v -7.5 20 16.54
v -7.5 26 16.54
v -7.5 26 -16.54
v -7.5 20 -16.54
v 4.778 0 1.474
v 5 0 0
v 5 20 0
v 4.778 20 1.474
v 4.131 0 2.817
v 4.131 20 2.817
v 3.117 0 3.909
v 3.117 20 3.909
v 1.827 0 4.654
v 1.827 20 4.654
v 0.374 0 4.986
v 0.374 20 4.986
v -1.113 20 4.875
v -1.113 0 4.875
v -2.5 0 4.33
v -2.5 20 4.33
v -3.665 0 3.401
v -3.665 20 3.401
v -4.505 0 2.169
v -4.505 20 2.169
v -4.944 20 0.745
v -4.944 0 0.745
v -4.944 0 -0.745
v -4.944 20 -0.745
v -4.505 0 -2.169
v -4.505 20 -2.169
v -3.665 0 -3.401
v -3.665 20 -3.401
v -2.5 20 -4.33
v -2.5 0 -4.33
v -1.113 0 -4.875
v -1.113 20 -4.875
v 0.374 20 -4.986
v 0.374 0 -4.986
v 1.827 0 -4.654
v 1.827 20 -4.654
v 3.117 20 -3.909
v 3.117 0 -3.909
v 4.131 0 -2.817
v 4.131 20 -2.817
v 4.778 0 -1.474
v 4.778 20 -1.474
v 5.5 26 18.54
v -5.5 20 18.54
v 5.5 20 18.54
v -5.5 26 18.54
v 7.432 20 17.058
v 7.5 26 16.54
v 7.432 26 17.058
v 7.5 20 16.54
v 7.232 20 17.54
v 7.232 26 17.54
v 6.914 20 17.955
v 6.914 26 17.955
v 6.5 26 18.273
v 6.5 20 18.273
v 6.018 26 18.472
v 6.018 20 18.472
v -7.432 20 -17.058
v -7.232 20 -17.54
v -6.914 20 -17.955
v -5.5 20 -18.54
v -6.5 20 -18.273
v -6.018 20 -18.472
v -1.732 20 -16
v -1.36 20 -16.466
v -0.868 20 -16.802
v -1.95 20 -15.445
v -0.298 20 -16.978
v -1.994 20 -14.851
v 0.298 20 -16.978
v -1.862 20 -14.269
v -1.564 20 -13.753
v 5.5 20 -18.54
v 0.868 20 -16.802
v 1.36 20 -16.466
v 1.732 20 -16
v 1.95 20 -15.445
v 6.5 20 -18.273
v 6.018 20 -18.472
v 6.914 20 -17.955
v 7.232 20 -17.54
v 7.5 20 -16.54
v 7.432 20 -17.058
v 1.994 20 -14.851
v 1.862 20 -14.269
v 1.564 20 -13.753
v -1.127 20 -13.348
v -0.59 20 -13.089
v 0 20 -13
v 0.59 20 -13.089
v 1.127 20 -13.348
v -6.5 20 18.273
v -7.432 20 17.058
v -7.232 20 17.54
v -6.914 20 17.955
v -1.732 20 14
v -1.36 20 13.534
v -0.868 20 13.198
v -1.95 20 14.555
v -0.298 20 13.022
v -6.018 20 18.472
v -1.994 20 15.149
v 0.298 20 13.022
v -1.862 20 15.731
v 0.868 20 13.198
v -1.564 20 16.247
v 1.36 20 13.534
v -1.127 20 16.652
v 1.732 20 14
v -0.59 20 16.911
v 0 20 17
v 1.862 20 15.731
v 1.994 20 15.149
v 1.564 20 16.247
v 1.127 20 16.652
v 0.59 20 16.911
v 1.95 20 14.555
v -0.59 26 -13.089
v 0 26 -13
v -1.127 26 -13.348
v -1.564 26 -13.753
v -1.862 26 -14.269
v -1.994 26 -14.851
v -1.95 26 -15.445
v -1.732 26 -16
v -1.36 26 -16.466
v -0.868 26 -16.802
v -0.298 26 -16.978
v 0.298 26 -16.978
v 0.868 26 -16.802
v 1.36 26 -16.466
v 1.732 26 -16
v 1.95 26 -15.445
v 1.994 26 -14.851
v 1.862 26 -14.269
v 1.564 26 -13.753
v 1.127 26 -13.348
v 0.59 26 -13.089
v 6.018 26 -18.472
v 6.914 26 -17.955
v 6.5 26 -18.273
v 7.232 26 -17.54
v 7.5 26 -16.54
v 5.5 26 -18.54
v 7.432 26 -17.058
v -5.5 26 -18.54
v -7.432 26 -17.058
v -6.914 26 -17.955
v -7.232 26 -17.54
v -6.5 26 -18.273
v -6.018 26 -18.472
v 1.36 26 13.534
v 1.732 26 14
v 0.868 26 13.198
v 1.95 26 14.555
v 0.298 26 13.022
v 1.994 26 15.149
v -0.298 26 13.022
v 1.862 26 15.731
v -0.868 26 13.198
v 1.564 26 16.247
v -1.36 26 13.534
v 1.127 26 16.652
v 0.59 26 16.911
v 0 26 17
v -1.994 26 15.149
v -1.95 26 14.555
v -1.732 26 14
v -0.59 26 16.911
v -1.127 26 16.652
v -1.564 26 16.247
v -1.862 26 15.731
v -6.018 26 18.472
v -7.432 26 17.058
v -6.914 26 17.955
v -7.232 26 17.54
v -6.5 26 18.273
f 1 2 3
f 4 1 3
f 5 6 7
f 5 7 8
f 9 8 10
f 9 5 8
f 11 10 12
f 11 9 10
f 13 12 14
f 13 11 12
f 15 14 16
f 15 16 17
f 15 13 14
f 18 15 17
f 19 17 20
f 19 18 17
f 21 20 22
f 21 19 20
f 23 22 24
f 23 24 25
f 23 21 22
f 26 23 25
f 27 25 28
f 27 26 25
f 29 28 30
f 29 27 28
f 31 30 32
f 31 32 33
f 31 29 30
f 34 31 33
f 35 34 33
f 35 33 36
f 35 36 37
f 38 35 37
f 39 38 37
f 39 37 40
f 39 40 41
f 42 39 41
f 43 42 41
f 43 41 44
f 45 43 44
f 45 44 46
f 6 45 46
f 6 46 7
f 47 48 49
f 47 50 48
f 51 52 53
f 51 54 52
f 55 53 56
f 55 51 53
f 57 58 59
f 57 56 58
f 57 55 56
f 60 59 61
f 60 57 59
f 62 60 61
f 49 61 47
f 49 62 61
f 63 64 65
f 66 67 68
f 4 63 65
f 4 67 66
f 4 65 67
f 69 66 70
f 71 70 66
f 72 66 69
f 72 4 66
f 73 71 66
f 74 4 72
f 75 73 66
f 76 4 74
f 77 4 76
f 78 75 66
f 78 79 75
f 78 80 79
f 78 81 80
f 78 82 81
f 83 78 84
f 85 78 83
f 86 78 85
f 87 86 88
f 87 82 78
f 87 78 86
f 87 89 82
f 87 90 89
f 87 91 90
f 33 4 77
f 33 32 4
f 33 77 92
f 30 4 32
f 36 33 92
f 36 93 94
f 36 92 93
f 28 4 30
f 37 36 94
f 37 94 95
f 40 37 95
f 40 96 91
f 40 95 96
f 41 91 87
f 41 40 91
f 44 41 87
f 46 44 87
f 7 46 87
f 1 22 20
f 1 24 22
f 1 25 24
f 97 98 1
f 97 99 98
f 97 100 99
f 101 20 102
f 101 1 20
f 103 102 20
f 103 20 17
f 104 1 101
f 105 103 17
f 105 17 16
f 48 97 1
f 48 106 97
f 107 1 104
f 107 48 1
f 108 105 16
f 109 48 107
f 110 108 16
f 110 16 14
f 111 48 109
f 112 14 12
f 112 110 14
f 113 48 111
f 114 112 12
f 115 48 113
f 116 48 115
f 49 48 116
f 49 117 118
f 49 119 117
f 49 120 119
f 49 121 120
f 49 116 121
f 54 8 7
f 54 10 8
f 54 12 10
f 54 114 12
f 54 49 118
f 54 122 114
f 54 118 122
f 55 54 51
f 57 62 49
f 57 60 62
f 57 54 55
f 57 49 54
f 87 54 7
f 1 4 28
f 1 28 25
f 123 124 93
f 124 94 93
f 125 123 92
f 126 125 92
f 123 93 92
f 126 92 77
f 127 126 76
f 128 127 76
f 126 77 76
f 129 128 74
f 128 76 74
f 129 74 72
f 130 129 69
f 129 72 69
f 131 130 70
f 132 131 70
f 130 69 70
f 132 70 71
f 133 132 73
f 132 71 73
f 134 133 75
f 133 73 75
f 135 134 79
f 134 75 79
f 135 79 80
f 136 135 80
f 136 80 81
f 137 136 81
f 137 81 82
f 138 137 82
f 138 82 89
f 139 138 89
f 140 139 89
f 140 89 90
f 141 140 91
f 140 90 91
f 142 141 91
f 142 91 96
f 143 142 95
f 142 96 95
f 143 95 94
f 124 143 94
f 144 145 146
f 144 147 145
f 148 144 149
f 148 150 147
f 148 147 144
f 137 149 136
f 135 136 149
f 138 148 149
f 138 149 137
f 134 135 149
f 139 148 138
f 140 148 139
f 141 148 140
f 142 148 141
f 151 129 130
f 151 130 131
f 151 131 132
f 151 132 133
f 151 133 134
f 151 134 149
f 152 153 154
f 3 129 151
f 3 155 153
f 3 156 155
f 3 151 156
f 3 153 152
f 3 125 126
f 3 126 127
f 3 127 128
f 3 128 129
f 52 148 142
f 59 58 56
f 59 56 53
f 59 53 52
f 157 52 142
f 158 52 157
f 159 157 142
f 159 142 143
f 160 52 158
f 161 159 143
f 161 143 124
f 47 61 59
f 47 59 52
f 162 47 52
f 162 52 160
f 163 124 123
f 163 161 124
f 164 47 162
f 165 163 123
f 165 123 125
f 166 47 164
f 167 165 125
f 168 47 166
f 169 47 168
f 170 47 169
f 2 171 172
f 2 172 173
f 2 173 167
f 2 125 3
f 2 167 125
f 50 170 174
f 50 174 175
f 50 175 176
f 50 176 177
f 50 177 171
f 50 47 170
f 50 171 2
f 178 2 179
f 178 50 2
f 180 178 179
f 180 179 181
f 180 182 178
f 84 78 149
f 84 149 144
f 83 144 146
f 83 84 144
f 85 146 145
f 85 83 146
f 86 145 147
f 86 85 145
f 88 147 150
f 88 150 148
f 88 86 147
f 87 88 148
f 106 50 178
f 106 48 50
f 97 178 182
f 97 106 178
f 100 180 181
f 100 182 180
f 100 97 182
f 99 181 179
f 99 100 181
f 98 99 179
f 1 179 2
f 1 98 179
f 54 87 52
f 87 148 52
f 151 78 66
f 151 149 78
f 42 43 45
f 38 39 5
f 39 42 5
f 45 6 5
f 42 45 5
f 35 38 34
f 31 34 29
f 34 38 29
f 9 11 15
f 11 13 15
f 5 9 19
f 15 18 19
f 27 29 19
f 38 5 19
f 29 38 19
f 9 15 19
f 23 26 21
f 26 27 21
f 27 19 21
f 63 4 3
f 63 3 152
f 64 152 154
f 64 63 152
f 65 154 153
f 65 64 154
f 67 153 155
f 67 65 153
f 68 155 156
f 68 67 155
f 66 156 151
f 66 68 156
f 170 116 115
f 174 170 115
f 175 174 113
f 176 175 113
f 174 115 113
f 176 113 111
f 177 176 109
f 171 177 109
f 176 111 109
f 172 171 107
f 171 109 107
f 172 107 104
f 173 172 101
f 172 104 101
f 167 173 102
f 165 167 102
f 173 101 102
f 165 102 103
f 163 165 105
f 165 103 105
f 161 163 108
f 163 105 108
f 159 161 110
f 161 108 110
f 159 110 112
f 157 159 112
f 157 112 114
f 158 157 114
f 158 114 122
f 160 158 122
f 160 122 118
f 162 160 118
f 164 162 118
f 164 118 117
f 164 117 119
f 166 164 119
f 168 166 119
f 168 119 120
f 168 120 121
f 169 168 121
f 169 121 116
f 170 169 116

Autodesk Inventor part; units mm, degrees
ref_plane "YZ Plane" through (0, 0, 0) normal (1, 0, 0) x (0, 1, 0)
ref_plane "XZ Plane" through (0, 0, 0) normal (0, 1, 0) x (-1, 0, 0)
ref_plane "XY Plane" through (0, 0, 0) normal (0, 0, 1) x (1, 0, 0)
sketch "Skizze1" plane through (0, 0, 0) normal (0, 1, 0) x (-1, 0, 0)
  circle A0 centre (0, 0) radius 20
  dimension "d0" = 40
extrude "Extrusion1" add sketch "Skizze1" along normal blind 26
ref_plane "Arbeitsebene1" through (0, 26, 0) normal (0, 1, 0) x (1, 0, 0)
sketch "Skizze2" plane through (0, 26, 0) normal (0, 1, 0) x (1, 0, 0)
  circle A0 centre (0, 0) radius 20 projected
  circle A1 centre (0, 0) radius 20 construction
  circle A2 centre (0, 0) radius 20 construction
  line L0 (0, 0) -> (0, 15) construction
  line L1 (0, 0) -> (0, -15) construction
  dimension "d4" = 15
  dimension "d5" = 15
hole "Bohrung1" at (0, 26, 15) at (0, 26, -15) direction (0, -1, 0) diameter 4 end through all
ref_plane "Arbeitsebene2" through (0, 0, 0) normal (0, -1, 0) x (1, 0, 0)
sketch "Skizze4" plane through (0, 0, 0) normal (0, -1, 0) x (1, 0, 0)
  point P0 (0, 0)
sketch "Skizze5" plane through (0, 0, 0) normal (0, -1, 0) x (1, 0, 0)
  line L0 (0, 0) -> (0, 20) construction
  circle A0 centre (0, 0) radius 20 construction
ref_plane "Arbeitsebene3" through (0, 0, 20) normal (0, 0, 1) x (1, 0, 0)
sketch "Skizze7" plane through (0, 0, 0) normal (0, -1, 0) x (1, 0, 0)
  circle A0 centre (0, 0) radius 5
  circle A1 centre (0, 0) radius 20
  dimension "d38" = 10
  dimension "d39" = 40
extrude "Extrusion2" cut sketch "Skizze7" against normal blind 20
sketch "Skizze8" plane through (0, 20, 0) normal (0, -1, 0) x (1, 0, 0)
  line L0 (-7.5, -25) -> (7.5, -25)
  line L1 (7.5, -25) -> (7.5, 25)
  line L2 (7.5, 25) -> (-7.5, 25)
  line L3 (-7.5, 25) -> (-7.5, -25)
  line L4 (-7.5, -25) -> (7.5, 25) construction
  line L5 (7.5, -25) -> (-7.5, 25) construction
  point P0 (0, 0)
  dimension "d42" = 15
  dimension "d43" = 50
extrude "Extrusion3" cut sketch "Skizze8" along normal through all both and the other way through all keep common part
sketch "Skizze9" plane through (0, 26, 0) normal (0, 1, 0) x (1, 0, 0)
  arc A0 (-7.5, -18.5405) -> (7.5, -18.5405) centre (0, 0) ccw projected
  line L0 (7.5, 18.5405) -> (-7.5, 18.5405)
  line L1 (-7.5, 18.5405) -> (-7.5, -18.5405)
  line L2 (-7.5, -18.5405) -> (7.5, -18.5405)
  line L3 (7.5, -18.5405) -> (7.5, 18.5405)
  line L4 (7.5, 18.5405) -> (-7.5, -18.5405) construction
  line L5 (-7.5, 18.5405) -> (7.5, -18.5405) construction
extrude "Extrusion4" cut sketch "Skizze9" against normal through all contours L1 L0 L3 L2 keep common part
fillet "Rundung1" radius 2 4 edges at (-7.5, 23, 18.5405) (-7.5, 23, -18.5405) (7.5, 23, 18.5405) (7.5, 23, -18.5405)
thread "Gewinde5" size "M4x0.7" class "6H" standard "ANSI Metric M Profile" full length
thread "Gewinde6" size "M4x0.7" class "6H" standard "ANSI Metric M Profile" full length
properties part number "spannring_achse_lager"
